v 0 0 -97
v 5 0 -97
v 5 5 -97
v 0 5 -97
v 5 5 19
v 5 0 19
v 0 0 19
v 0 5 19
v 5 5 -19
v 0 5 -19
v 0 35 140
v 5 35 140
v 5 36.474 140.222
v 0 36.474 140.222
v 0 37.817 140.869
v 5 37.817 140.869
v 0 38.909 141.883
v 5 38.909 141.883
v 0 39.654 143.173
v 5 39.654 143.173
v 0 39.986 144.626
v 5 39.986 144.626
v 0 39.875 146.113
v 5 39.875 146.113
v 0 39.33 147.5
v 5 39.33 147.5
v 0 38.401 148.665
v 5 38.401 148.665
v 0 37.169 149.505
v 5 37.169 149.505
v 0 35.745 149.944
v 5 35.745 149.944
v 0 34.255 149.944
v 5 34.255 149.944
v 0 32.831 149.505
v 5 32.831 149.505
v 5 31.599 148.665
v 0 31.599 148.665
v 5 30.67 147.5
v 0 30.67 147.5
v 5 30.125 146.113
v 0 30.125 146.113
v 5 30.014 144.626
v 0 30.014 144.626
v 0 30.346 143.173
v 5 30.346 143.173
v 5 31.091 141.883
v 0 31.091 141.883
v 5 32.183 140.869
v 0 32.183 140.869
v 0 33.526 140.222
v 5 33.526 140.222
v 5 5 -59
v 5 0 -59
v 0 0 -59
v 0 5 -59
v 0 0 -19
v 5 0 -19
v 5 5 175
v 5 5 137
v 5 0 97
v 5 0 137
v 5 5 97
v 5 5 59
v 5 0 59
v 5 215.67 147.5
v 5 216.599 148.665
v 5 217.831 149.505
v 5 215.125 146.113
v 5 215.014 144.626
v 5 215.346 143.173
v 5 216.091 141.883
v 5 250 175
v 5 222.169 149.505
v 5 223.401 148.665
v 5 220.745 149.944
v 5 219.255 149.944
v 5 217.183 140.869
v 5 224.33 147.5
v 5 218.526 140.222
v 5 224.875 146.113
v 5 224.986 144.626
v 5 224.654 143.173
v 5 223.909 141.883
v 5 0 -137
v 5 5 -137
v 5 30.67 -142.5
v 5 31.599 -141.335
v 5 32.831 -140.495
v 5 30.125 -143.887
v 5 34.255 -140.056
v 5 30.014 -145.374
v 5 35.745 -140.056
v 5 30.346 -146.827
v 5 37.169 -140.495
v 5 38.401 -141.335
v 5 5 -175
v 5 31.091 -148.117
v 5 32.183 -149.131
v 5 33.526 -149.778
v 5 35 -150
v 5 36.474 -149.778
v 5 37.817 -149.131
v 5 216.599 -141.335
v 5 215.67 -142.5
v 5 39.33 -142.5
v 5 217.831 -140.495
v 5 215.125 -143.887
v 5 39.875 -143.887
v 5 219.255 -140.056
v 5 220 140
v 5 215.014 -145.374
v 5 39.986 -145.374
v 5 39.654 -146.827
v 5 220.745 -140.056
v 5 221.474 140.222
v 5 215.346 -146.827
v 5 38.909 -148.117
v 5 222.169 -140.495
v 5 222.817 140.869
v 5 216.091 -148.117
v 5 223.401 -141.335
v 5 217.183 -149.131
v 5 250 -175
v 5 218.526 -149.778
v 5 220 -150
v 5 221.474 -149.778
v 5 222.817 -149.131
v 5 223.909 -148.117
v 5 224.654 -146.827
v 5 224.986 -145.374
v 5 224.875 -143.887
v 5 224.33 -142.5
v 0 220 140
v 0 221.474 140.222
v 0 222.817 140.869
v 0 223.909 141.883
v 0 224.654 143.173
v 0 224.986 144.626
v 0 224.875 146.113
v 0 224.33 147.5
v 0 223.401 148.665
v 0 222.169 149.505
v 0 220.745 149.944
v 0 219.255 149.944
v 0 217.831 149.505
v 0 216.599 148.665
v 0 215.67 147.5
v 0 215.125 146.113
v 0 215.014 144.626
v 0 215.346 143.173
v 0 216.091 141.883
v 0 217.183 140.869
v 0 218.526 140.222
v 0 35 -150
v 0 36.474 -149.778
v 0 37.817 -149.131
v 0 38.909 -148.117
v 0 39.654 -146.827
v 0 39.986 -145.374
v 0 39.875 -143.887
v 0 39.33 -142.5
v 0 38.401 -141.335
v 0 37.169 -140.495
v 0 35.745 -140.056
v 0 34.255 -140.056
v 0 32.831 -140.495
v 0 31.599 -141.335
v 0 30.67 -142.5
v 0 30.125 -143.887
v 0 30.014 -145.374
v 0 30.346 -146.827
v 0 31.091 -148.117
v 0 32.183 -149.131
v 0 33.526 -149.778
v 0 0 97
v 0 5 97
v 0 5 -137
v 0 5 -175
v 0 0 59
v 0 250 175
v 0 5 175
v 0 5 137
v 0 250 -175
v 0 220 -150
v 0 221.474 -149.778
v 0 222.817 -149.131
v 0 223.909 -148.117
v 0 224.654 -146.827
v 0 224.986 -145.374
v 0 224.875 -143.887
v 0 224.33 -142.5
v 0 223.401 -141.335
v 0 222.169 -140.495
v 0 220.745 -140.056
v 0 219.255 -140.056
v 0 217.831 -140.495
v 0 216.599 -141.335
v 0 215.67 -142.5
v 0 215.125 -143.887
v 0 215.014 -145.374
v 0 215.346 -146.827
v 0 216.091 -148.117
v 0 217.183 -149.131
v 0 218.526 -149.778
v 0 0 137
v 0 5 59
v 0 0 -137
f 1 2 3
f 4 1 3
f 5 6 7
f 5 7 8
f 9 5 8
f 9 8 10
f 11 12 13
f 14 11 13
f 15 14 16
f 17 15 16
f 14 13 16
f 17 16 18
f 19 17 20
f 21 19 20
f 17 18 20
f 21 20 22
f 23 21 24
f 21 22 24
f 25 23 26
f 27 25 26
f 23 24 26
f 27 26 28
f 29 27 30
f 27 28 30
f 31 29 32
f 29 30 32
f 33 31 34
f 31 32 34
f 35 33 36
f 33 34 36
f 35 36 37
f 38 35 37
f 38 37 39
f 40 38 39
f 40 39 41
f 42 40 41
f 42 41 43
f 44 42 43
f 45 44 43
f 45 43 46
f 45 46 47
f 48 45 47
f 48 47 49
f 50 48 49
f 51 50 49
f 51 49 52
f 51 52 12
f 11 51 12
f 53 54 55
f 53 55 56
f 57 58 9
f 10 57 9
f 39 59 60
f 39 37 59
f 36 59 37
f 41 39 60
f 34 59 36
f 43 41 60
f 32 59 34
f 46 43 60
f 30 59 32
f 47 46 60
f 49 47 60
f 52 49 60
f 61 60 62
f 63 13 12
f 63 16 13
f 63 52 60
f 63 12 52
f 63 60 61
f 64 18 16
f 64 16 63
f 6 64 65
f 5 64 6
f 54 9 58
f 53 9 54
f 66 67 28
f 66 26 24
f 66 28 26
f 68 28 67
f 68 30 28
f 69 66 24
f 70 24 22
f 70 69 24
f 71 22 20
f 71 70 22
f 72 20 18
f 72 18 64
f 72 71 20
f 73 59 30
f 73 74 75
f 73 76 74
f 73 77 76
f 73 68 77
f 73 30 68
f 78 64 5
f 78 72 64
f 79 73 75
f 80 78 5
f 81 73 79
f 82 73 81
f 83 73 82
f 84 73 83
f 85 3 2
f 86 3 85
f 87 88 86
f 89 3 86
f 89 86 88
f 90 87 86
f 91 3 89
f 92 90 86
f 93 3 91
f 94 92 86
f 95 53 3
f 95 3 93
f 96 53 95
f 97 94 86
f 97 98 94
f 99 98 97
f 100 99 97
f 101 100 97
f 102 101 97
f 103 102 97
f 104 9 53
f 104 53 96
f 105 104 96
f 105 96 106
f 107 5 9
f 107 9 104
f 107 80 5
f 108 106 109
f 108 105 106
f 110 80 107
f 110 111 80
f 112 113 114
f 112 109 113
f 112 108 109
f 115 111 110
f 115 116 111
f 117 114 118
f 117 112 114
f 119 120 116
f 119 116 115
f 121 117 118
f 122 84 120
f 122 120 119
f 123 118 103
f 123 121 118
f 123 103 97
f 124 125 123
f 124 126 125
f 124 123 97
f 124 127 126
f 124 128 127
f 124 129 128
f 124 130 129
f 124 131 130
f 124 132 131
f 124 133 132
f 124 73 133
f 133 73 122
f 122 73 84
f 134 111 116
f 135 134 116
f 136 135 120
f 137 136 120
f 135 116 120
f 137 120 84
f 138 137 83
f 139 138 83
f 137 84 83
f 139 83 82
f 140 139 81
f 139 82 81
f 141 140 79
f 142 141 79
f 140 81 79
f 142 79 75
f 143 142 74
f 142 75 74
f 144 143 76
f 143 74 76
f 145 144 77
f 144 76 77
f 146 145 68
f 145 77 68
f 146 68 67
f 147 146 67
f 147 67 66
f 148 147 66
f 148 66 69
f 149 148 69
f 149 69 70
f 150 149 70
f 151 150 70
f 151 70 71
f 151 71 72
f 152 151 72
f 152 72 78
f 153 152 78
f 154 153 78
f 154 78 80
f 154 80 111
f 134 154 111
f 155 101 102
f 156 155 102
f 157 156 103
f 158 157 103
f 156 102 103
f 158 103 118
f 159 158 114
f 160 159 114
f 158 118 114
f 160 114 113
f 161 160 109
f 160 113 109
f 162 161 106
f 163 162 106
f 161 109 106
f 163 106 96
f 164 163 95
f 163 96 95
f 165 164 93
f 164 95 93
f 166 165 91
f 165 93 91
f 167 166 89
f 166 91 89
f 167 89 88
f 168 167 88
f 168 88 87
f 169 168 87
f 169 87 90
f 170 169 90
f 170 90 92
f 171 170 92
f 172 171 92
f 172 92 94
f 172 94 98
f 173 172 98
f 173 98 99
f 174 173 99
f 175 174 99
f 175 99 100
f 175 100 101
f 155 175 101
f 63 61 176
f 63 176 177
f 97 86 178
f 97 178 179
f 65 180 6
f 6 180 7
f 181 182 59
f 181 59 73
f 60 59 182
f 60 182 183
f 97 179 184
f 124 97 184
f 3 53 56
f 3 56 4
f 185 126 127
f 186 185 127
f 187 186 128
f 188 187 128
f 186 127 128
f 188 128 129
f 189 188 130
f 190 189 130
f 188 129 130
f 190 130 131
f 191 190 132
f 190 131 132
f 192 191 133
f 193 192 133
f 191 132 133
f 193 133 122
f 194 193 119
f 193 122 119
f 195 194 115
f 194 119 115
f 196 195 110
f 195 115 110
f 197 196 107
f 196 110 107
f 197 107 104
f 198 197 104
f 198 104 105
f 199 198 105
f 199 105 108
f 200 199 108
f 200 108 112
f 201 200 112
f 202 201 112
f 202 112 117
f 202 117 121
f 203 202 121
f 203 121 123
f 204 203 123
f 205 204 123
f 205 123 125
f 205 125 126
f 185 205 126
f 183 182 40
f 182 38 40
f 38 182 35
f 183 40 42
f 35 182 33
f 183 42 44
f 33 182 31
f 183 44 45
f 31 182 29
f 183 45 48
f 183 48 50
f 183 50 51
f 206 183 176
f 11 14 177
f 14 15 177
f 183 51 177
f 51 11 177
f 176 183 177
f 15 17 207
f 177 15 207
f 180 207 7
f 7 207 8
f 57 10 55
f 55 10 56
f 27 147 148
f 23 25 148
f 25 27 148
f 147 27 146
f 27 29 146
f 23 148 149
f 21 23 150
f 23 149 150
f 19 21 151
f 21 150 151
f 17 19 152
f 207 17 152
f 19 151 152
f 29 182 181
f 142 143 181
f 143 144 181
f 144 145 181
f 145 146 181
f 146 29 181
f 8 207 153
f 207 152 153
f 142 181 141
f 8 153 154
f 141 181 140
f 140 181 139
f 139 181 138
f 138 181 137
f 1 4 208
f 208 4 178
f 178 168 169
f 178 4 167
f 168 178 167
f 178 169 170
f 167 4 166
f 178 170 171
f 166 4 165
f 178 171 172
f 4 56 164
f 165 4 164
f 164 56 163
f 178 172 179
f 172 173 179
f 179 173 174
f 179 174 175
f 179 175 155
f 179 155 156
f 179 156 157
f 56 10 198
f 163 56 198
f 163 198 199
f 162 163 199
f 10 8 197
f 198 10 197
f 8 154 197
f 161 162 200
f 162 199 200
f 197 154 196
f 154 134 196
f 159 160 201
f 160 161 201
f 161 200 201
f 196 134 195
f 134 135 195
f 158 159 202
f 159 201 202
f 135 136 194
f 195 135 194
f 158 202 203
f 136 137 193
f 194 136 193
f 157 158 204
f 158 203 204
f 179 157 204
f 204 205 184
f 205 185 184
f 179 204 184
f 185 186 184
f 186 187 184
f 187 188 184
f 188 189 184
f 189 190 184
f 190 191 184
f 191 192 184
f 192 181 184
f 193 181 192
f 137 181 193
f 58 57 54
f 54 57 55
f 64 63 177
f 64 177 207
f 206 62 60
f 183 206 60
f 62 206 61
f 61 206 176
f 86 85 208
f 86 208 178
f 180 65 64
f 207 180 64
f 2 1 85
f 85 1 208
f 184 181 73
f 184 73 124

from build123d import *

# Parameters (mm, degrees)
SKIZZE1_W                  = 350
SKIZZE1_H                  = 250
GRUNDPLATTE_DEPTH          = 5
SKIZZE2_W                  = 38
SKIZZE2_H                  = 5
ZAPFEN_BODEN_DEPTH         = 6
SKIZZE3_R                  = 5
VERBINDUNGSBOHRUNGEN_DEPTH = 6


with BuildPart() as part:
    # Skizze1 → Grundplatte (new body)
    with BuildSketch(Plane(origin=(0, 0, 0), x_dir=(0, 0, -1), z_dir=(1, 0, 0))):
        with Locations((0, 125)):
            Rectangle(SKIZZE1_W, SKIZZE1_H)
    extrude(amount=GRUNDPLATTE_DEPTH)

    # Skizze2 → Zapfen Boden (cut, through all)
    with BuildSketch(Plane(origin=(5, 0, 0), x_dir=(0, 0, -1), z_dir=(1, 0, 0))):
        with Locations((-156, 2.5)):
            Rectangle(SKIZZE2_W, SKIZZE2_H)
        with Locations((-78, 2.5)):
            Rectangle(SKIZZE2_W, SKIZZE2_H)
        with Locations((0, 2.5)):
            Rectangle(SKIZZE2_W, SKIZZE2_H)
        with Locations((78, 2.5)):
            Rectangle(SKIZZE2_W, SKIZZE2_H)
        with Locations((156, 2.5)):
            Rectangle(SKIZZE2_W, SKIZZE2_H)
    extrude(amount=-ZAPFEN_BODEN_DEPTH, mode=Mode.SUBTRACT)

    # Skizze3 → Verbindungsbohrungen (cut, through all)
    with BuildSketch(Plane(origin=(5, 0, 0), x_dir=(0, 0, -1), z_dir=(1, 0, 0))):
        with Locations((145, 220)):
            Circle(SKIZZE3_R)
        with Locations((-145, 220)):
            Circle(SKIZZE3_R)
        with Locations((-145, 35)):
            Circle(SKIZZE3_R)
        with Locations((145, 35)):
            Circle(SKIZZE3_R)
    extrude(amount=-VERBINDUNGSBOHRUNGEN_DEPTH, mode=Mode.SUBTRACT)


solid = part.part
